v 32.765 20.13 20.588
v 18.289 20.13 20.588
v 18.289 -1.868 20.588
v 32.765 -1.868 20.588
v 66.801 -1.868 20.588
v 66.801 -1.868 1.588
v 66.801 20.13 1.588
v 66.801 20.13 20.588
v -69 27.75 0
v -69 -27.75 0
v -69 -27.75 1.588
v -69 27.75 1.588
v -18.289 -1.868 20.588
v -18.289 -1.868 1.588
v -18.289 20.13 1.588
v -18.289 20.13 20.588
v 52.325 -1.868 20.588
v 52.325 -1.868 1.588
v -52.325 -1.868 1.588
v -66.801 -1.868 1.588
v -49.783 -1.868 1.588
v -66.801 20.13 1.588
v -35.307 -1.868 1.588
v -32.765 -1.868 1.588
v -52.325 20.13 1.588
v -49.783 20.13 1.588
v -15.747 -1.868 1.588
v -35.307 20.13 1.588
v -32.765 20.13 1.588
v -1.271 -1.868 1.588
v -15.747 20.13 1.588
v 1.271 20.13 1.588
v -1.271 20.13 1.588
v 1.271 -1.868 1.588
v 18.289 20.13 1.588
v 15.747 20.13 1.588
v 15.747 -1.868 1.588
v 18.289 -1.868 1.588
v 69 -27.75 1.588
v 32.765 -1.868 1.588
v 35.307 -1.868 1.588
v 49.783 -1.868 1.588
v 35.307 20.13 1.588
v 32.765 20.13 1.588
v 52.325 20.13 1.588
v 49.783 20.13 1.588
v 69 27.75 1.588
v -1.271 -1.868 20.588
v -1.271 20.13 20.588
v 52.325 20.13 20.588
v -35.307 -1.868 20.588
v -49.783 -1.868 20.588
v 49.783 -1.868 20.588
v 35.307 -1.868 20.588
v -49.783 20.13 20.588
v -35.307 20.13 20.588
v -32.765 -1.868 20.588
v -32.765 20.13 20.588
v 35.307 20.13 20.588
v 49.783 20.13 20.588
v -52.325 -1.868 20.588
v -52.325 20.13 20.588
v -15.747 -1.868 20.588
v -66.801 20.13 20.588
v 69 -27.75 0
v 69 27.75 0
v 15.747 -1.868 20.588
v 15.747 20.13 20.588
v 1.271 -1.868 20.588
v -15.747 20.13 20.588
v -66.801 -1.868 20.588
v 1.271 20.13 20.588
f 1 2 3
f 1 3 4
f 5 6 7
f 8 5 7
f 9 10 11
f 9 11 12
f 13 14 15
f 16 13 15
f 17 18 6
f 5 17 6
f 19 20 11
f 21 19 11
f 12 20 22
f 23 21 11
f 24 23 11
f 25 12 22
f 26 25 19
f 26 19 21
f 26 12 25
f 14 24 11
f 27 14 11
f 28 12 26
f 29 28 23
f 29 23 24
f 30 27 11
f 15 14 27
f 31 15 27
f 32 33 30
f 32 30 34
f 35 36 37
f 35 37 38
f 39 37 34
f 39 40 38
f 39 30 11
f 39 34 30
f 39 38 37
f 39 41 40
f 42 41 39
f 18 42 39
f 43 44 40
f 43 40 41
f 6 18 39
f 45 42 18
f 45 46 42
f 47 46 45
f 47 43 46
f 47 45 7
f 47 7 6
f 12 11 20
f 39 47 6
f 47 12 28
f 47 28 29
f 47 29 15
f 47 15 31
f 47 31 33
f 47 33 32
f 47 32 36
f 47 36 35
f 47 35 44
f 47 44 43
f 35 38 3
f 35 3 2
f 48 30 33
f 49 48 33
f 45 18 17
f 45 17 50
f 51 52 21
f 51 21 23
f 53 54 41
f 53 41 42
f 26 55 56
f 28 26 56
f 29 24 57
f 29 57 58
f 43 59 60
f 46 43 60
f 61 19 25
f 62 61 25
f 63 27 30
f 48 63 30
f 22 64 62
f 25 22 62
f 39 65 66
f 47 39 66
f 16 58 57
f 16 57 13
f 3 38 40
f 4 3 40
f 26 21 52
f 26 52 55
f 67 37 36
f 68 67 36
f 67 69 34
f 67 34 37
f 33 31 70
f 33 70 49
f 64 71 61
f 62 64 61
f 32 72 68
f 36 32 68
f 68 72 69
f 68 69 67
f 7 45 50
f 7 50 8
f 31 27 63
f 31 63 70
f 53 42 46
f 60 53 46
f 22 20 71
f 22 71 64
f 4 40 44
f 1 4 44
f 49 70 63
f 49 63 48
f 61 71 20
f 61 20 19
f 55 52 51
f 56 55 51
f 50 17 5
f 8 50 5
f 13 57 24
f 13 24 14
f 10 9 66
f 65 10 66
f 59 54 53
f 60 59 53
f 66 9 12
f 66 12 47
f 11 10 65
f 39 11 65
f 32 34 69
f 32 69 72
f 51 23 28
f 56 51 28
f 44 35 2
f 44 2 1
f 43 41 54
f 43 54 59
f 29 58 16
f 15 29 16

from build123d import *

# Parameters (mm, degrees)
F0_W     = 138
F0_H     = 55.5
F1_DEPTH = 1.5875
F2_W     = 14.4751365056
F2_H     = 21.9978075475
F3_DEPTH = 19


# Not quite as in the source:
# - a feature names something its author has since deleted; it is built from what else it names


with BuildPart() as f1:
    # F0 (on Top) → F1 (new body)
    with BuildSketch(Plane.XY):
        Rectangle(F0_W, F0_H)
    extrude(amount=F1_DEPTH)

    # F2 (on face) → F3 (join)
    with BuildSketch(Plane.XY.offset(1.5875)):
        with Locations((-25.527, 9.1310962263)):
            Rectangle(F2_W, F2_H)
        with Locations((-8.509, 9.1310962263)):
            Rectangle(F2_W, F2_H)
        with Locations((8.509, 9.1310962263)):
            Rectangle(F2_W, F2_H)
        with Locations((25.527, 9.1310962263)):
            Rectangle(F2_W, F2_H)
        with Locations((42.545, 9.1310962263)):
            Rectangle(F2_W, F2_H)
        with Locations((59.563, 9.1310962263)):
            Rectangle(F2_W, F2_H)
        with Locations((-42.545, 9.1310962263)):
            Rectangle(F2_W, F2_H)
        with Locations((-59.563, 9.1310962263)):
            Rectangle(F2_W, F2_H)
    extrude(amount=F3_DEPTH)


solid = f1.part
